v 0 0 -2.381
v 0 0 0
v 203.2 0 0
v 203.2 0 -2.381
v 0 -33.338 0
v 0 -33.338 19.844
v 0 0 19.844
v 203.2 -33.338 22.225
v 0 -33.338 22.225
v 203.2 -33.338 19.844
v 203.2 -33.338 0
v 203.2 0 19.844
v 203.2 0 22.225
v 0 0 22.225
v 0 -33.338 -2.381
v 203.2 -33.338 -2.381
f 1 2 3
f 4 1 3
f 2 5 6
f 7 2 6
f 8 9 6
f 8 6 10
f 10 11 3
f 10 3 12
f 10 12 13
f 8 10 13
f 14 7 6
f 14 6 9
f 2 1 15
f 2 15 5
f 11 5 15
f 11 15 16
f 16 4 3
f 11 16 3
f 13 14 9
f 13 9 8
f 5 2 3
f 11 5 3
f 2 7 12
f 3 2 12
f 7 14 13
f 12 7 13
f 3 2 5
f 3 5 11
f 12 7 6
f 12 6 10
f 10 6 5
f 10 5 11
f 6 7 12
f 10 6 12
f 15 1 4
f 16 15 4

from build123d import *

# Parameters (mm, degrees)
F0_W     = 203.2
F0_H     = 19.84375
F1_DEPTH = 33.3375
F2_W     = 203.2
F2_H     = 2.38125
F3_DEPTH = 33.3375


with BuildPart() as f1:
    # F0 (on Front) → F1 (new body)
    with BuildSketch(Plane.XZ):
        with Locations((101.6, 9.921875)):
            Rectangle(F0_W, F0_H)
    extrude(amount=F1_DEPTH)


with BuildPart() as f3:
    # F2 (on Front) → F3 (new body)
    with BuildSketch(Plane.XZ):
        with Locations((101.6, 21.034375)):
            Rectangle(F2_W, F2_H)
        with Locations((101.6, -1.190625)):
            Rectangle(F2_W, F2_H)
    extrude(amount=F3_DEPTH)


solid = Compound([f1.part, f3.part])
